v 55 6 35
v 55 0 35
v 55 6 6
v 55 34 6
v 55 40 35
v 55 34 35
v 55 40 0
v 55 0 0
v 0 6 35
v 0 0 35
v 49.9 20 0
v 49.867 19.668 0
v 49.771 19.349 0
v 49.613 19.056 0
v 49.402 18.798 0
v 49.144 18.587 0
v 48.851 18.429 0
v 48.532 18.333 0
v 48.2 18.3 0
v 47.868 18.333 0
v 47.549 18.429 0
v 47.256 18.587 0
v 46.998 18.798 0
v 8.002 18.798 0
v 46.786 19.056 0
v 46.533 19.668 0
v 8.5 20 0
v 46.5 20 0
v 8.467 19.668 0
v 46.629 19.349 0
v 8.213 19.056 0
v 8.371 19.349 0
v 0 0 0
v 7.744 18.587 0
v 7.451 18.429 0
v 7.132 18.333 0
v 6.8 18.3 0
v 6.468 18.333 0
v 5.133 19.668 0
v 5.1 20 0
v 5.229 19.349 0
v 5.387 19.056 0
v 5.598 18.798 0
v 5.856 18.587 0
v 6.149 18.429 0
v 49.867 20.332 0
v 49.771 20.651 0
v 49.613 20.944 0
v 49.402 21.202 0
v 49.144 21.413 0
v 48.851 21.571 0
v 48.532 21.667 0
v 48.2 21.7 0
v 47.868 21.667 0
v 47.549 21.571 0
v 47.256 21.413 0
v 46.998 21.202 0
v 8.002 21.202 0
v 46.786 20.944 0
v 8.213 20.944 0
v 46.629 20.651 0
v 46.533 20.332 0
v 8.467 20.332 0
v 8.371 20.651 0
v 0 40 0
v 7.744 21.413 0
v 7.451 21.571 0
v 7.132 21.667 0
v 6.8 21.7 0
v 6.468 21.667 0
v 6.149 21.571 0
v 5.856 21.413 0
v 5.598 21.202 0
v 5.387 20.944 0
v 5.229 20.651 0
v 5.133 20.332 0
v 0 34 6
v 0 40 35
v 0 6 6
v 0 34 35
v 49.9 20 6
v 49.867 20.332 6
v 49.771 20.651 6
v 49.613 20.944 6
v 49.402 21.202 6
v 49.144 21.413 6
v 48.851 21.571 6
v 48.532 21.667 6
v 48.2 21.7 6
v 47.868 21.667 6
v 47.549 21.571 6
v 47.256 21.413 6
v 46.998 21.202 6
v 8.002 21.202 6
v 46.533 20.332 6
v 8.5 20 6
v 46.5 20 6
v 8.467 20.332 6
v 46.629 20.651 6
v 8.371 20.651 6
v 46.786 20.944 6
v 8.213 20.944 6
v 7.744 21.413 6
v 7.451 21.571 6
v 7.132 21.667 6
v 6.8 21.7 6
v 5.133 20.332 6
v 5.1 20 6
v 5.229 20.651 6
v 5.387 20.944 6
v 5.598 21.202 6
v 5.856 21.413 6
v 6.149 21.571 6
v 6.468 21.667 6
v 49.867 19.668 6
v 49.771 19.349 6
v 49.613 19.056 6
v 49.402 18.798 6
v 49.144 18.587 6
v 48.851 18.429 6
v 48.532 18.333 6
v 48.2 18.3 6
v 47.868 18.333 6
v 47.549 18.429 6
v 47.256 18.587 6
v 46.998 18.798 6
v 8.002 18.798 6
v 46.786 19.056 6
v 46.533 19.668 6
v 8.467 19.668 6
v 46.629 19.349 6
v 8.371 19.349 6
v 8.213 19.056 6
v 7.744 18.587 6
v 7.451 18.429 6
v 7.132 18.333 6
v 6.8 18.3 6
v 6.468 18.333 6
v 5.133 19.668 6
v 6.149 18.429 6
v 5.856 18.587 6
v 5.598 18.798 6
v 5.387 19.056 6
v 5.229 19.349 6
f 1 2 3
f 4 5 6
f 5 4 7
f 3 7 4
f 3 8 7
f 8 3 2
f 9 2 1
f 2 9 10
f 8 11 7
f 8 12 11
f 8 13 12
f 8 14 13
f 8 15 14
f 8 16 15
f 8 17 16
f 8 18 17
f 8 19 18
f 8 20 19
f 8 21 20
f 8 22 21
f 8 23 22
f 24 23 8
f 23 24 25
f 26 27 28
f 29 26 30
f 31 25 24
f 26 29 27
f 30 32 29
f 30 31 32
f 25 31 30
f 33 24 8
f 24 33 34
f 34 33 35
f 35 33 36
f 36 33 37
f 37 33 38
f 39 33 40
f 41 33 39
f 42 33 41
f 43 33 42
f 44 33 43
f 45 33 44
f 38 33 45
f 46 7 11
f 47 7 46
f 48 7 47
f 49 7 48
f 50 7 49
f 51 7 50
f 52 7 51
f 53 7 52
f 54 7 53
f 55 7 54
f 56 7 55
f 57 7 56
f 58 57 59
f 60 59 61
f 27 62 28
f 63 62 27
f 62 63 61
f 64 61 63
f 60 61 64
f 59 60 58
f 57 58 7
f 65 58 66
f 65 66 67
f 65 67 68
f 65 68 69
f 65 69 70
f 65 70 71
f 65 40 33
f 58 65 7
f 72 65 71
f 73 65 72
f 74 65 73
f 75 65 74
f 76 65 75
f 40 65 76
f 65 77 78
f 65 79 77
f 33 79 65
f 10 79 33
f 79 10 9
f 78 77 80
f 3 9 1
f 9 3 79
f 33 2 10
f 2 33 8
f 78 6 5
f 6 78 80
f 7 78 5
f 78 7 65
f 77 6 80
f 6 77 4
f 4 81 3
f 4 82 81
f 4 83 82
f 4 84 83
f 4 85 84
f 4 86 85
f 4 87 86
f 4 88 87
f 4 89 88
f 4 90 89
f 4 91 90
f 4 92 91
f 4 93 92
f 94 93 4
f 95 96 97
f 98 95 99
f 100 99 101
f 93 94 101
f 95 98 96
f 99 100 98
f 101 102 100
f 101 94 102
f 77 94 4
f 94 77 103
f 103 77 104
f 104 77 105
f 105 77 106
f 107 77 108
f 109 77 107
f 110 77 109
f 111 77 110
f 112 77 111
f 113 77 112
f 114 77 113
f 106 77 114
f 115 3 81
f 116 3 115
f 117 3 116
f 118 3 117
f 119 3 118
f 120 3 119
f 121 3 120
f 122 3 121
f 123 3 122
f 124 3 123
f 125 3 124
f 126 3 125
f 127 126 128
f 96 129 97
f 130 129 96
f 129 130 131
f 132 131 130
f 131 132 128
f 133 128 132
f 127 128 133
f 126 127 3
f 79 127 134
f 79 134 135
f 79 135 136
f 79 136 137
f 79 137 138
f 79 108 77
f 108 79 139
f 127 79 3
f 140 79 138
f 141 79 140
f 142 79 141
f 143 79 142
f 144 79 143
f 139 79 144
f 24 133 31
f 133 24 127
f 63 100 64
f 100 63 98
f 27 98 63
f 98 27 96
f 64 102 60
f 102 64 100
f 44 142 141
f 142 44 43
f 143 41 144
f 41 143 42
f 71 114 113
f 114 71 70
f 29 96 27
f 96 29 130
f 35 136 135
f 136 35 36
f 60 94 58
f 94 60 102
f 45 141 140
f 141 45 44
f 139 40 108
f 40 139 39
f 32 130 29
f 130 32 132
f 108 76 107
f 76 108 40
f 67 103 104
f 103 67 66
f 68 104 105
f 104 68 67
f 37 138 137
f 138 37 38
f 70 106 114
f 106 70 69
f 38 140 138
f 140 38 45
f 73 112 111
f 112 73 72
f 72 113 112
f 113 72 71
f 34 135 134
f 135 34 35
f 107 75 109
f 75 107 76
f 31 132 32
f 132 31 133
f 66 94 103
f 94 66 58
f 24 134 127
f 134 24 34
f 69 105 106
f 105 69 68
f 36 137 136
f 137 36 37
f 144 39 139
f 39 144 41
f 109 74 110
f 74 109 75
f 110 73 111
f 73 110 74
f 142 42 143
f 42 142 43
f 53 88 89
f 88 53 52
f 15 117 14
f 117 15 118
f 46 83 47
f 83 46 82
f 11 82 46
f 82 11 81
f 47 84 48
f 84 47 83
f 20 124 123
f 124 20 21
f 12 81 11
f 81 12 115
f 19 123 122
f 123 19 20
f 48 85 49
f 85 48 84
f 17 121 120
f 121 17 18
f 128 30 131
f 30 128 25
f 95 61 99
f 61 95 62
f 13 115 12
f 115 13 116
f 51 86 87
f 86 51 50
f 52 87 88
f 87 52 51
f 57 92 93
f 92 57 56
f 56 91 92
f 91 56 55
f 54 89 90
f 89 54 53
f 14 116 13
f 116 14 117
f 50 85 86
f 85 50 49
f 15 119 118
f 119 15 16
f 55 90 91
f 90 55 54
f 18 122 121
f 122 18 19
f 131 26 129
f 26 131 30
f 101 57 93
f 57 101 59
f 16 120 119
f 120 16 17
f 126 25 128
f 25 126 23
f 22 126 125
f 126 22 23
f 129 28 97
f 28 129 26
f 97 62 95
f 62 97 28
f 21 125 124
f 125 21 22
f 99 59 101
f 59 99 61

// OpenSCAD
$fn = 32;

// ----------------------------------------------------------------------
// U-bracket: 55 x 40 x 35 mm
// ----------------------------------------------------------------------

// --- parameters (mm) ---
span = 55;                // outer length, X
outer_w = 40;             // outer width, Y
wall_h = 35;              // upright height, Z
plate_t = 6;              // wall thickness
hole_d = 3.4;             // clearance for M3

module hole_z(px, py) {
  translate([px, py, -2.5]) cylinder(h = plate_t + 5, d = hole_d);
}
module hole_y_pz(pz) {
  /* through both uprights along Y */
  translate([0, -2.5, pz]) rotate([-90, 0, 0]) cylinder(h = outer_w + 5, d = hole_d);
}

module base() {
  cube([span, outer_w, plate_t]);
}

module uprights() {
  cube([span, plate_t, wall_h]);
  translate([0, outer_w - plate_t, 0]) cube([span, plate_t, wall_h]);
}

difference() {
  union() {
    base();
    uprights();
  }
  hole_z(6.8, 20);
  hole_z(48.2, 20);
}
